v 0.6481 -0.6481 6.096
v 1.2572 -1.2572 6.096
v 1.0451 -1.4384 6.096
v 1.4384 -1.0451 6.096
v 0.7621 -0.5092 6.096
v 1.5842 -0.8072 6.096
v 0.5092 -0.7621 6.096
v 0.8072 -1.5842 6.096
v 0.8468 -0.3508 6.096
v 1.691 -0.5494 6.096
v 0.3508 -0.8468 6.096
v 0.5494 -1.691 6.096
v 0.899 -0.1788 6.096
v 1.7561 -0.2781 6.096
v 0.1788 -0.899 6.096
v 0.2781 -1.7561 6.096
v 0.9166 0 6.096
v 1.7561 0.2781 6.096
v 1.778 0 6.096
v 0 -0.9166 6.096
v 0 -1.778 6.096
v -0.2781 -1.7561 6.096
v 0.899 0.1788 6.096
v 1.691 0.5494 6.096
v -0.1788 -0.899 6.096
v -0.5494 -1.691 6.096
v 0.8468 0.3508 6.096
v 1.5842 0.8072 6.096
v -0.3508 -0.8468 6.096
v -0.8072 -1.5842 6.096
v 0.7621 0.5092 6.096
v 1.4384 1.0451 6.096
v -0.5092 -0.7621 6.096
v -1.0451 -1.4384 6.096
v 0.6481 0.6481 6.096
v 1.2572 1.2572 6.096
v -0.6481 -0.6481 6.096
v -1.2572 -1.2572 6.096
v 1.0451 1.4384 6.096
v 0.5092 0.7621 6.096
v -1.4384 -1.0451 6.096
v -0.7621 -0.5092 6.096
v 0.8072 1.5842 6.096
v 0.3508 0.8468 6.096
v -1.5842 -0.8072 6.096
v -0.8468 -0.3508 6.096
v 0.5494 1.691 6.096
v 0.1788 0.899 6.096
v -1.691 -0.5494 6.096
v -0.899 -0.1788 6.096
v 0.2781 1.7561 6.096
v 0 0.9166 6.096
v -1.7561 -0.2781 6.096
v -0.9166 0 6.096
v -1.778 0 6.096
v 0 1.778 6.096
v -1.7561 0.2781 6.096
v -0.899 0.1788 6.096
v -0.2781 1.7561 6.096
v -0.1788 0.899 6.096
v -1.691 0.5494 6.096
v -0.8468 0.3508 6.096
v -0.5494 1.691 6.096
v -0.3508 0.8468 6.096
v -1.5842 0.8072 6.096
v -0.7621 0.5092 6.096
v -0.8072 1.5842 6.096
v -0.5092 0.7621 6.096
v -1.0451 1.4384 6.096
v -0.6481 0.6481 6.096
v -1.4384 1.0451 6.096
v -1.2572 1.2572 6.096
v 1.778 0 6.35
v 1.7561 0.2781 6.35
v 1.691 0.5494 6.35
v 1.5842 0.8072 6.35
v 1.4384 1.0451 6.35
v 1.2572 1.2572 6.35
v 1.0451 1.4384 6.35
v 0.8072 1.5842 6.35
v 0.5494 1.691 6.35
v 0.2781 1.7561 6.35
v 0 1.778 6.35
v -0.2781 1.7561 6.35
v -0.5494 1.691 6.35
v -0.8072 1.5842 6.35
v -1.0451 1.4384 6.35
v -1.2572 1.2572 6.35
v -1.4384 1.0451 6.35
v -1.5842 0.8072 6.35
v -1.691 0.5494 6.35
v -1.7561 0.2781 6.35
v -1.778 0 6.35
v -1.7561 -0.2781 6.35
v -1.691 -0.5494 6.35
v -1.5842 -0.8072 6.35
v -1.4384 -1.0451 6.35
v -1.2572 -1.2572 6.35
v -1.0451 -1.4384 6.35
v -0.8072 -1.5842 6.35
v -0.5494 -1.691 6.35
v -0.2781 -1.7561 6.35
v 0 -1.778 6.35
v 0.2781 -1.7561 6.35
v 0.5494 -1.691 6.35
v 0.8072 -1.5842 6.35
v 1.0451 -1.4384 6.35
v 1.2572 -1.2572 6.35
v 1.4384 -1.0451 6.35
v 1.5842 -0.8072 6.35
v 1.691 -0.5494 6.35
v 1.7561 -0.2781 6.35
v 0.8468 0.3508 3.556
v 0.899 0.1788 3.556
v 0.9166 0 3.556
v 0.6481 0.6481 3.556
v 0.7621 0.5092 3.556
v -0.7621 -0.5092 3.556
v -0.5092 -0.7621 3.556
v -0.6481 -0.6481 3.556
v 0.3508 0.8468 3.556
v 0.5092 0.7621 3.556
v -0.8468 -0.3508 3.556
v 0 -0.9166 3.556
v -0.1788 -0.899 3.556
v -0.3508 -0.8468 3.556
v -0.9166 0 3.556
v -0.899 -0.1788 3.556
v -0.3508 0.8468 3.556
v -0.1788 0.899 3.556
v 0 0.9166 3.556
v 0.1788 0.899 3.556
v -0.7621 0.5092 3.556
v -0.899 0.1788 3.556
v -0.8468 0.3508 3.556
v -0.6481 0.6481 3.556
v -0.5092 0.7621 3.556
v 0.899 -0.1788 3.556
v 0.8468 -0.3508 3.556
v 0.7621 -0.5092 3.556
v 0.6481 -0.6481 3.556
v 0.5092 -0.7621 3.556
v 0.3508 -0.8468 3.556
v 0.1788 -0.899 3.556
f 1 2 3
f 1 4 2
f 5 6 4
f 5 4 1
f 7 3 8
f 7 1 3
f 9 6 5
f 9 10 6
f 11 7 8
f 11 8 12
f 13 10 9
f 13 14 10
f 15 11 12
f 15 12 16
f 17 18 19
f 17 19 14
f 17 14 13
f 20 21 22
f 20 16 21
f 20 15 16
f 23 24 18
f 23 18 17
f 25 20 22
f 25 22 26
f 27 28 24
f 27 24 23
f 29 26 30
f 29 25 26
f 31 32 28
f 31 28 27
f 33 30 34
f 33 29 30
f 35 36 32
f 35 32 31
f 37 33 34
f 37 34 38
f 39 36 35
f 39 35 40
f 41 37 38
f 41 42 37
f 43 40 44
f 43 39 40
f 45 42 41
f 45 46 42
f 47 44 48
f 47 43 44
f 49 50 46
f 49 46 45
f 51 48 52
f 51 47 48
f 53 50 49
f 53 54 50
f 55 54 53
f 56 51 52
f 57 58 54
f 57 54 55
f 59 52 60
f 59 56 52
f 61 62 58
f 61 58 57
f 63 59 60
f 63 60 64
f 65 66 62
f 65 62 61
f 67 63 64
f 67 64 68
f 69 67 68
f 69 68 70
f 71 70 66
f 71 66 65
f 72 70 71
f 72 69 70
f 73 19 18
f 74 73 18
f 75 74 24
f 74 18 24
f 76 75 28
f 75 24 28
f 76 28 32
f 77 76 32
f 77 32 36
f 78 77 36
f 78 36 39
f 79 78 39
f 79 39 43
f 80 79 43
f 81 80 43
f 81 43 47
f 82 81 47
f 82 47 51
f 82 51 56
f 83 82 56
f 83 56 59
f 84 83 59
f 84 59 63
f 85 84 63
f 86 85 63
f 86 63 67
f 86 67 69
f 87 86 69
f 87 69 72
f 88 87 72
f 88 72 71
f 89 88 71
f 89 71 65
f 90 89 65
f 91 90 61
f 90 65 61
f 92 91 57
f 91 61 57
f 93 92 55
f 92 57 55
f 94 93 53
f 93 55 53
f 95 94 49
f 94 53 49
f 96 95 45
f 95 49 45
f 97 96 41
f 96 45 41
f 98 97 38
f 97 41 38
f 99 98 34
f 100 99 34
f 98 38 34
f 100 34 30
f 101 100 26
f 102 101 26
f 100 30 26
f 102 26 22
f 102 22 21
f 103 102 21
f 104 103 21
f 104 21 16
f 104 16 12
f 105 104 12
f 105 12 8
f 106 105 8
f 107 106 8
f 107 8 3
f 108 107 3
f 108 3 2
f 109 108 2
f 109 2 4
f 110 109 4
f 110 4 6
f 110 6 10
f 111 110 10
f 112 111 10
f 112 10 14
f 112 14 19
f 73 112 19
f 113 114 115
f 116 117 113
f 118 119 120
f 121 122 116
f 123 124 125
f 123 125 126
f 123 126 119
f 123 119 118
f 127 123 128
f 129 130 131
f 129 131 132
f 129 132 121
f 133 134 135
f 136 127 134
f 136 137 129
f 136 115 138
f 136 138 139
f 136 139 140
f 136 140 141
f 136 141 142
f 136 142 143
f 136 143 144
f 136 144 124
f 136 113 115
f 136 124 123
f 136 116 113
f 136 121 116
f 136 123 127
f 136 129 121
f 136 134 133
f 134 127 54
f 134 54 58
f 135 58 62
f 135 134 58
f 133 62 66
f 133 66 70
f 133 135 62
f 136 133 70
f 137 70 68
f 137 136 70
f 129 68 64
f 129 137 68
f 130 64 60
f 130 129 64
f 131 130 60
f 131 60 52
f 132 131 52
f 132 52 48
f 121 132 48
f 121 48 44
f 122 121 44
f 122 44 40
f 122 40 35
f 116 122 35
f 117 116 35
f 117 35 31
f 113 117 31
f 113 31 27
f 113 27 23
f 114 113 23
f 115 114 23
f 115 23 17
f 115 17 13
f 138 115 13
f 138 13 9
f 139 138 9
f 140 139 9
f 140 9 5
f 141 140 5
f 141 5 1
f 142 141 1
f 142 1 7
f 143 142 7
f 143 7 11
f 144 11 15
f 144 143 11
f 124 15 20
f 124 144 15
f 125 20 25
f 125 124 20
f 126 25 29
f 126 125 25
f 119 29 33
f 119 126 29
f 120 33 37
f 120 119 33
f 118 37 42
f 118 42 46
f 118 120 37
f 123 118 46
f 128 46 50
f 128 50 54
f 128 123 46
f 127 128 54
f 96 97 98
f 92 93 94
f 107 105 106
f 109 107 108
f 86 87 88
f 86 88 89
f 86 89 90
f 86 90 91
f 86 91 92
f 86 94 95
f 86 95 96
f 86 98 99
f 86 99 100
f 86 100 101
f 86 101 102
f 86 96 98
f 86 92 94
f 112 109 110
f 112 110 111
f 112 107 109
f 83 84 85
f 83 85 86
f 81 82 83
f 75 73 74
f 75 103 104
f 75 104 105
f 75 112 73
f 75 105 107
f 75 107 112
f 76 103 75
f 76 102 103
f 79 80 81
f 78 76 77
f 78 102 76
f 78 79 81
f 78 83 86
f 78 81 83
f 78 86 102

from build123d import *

# Parameters (mm, degrees)
SKETCH1_R           = 1.778
BOSS_EXTRUDE1_DEPTH = 6.35
SKETCH5_R           = 1.778
SKETCH5_R_2         = 0.916592799
CUT_EXTRUDE3_DEPTH  = 6.096
SKETCH6_R           = 0.916592799
CUT_EXTRUDE4_DEPTH  = 3.556


with BuildPart() as part:
    # Sketch1 → Boss-Extrude1 (new body)
    with BuildSketch(Plane.XY):
        Circle(SKETCH1_R)
    extrude(amount=BOSS_EXTRUDE1_DEPTH)

    # Sketch5 → Cut-Extrude3 (cut)
    with BuildSketch(Plane(origin=(0, 0, 0), x_dir=(-1, 0, 0), z_dir=(0, 0, -1))):
        Circle(SKETCH5_R)
        Circle(SKETCH5_R_2, mode=Mode.SUBTRACT)
    extrude(amount=-CUT_EXTRUDE3_DEPTH, mode=Mode.SUBTRACT)

    # Sketch6 → Cut-Extrude4 (cut)
    with BuildSketch(Plane(origin=(0, 0, 0), x_dir=(-1, 0, 0), z_dir=(0, 0, -1))):
        Circle(SKETCH6_R)
    extrude(amount=-CUT_EXTRUDE4_DEPTH, mode=Mode.SUBTRACT)


solid = part.part
